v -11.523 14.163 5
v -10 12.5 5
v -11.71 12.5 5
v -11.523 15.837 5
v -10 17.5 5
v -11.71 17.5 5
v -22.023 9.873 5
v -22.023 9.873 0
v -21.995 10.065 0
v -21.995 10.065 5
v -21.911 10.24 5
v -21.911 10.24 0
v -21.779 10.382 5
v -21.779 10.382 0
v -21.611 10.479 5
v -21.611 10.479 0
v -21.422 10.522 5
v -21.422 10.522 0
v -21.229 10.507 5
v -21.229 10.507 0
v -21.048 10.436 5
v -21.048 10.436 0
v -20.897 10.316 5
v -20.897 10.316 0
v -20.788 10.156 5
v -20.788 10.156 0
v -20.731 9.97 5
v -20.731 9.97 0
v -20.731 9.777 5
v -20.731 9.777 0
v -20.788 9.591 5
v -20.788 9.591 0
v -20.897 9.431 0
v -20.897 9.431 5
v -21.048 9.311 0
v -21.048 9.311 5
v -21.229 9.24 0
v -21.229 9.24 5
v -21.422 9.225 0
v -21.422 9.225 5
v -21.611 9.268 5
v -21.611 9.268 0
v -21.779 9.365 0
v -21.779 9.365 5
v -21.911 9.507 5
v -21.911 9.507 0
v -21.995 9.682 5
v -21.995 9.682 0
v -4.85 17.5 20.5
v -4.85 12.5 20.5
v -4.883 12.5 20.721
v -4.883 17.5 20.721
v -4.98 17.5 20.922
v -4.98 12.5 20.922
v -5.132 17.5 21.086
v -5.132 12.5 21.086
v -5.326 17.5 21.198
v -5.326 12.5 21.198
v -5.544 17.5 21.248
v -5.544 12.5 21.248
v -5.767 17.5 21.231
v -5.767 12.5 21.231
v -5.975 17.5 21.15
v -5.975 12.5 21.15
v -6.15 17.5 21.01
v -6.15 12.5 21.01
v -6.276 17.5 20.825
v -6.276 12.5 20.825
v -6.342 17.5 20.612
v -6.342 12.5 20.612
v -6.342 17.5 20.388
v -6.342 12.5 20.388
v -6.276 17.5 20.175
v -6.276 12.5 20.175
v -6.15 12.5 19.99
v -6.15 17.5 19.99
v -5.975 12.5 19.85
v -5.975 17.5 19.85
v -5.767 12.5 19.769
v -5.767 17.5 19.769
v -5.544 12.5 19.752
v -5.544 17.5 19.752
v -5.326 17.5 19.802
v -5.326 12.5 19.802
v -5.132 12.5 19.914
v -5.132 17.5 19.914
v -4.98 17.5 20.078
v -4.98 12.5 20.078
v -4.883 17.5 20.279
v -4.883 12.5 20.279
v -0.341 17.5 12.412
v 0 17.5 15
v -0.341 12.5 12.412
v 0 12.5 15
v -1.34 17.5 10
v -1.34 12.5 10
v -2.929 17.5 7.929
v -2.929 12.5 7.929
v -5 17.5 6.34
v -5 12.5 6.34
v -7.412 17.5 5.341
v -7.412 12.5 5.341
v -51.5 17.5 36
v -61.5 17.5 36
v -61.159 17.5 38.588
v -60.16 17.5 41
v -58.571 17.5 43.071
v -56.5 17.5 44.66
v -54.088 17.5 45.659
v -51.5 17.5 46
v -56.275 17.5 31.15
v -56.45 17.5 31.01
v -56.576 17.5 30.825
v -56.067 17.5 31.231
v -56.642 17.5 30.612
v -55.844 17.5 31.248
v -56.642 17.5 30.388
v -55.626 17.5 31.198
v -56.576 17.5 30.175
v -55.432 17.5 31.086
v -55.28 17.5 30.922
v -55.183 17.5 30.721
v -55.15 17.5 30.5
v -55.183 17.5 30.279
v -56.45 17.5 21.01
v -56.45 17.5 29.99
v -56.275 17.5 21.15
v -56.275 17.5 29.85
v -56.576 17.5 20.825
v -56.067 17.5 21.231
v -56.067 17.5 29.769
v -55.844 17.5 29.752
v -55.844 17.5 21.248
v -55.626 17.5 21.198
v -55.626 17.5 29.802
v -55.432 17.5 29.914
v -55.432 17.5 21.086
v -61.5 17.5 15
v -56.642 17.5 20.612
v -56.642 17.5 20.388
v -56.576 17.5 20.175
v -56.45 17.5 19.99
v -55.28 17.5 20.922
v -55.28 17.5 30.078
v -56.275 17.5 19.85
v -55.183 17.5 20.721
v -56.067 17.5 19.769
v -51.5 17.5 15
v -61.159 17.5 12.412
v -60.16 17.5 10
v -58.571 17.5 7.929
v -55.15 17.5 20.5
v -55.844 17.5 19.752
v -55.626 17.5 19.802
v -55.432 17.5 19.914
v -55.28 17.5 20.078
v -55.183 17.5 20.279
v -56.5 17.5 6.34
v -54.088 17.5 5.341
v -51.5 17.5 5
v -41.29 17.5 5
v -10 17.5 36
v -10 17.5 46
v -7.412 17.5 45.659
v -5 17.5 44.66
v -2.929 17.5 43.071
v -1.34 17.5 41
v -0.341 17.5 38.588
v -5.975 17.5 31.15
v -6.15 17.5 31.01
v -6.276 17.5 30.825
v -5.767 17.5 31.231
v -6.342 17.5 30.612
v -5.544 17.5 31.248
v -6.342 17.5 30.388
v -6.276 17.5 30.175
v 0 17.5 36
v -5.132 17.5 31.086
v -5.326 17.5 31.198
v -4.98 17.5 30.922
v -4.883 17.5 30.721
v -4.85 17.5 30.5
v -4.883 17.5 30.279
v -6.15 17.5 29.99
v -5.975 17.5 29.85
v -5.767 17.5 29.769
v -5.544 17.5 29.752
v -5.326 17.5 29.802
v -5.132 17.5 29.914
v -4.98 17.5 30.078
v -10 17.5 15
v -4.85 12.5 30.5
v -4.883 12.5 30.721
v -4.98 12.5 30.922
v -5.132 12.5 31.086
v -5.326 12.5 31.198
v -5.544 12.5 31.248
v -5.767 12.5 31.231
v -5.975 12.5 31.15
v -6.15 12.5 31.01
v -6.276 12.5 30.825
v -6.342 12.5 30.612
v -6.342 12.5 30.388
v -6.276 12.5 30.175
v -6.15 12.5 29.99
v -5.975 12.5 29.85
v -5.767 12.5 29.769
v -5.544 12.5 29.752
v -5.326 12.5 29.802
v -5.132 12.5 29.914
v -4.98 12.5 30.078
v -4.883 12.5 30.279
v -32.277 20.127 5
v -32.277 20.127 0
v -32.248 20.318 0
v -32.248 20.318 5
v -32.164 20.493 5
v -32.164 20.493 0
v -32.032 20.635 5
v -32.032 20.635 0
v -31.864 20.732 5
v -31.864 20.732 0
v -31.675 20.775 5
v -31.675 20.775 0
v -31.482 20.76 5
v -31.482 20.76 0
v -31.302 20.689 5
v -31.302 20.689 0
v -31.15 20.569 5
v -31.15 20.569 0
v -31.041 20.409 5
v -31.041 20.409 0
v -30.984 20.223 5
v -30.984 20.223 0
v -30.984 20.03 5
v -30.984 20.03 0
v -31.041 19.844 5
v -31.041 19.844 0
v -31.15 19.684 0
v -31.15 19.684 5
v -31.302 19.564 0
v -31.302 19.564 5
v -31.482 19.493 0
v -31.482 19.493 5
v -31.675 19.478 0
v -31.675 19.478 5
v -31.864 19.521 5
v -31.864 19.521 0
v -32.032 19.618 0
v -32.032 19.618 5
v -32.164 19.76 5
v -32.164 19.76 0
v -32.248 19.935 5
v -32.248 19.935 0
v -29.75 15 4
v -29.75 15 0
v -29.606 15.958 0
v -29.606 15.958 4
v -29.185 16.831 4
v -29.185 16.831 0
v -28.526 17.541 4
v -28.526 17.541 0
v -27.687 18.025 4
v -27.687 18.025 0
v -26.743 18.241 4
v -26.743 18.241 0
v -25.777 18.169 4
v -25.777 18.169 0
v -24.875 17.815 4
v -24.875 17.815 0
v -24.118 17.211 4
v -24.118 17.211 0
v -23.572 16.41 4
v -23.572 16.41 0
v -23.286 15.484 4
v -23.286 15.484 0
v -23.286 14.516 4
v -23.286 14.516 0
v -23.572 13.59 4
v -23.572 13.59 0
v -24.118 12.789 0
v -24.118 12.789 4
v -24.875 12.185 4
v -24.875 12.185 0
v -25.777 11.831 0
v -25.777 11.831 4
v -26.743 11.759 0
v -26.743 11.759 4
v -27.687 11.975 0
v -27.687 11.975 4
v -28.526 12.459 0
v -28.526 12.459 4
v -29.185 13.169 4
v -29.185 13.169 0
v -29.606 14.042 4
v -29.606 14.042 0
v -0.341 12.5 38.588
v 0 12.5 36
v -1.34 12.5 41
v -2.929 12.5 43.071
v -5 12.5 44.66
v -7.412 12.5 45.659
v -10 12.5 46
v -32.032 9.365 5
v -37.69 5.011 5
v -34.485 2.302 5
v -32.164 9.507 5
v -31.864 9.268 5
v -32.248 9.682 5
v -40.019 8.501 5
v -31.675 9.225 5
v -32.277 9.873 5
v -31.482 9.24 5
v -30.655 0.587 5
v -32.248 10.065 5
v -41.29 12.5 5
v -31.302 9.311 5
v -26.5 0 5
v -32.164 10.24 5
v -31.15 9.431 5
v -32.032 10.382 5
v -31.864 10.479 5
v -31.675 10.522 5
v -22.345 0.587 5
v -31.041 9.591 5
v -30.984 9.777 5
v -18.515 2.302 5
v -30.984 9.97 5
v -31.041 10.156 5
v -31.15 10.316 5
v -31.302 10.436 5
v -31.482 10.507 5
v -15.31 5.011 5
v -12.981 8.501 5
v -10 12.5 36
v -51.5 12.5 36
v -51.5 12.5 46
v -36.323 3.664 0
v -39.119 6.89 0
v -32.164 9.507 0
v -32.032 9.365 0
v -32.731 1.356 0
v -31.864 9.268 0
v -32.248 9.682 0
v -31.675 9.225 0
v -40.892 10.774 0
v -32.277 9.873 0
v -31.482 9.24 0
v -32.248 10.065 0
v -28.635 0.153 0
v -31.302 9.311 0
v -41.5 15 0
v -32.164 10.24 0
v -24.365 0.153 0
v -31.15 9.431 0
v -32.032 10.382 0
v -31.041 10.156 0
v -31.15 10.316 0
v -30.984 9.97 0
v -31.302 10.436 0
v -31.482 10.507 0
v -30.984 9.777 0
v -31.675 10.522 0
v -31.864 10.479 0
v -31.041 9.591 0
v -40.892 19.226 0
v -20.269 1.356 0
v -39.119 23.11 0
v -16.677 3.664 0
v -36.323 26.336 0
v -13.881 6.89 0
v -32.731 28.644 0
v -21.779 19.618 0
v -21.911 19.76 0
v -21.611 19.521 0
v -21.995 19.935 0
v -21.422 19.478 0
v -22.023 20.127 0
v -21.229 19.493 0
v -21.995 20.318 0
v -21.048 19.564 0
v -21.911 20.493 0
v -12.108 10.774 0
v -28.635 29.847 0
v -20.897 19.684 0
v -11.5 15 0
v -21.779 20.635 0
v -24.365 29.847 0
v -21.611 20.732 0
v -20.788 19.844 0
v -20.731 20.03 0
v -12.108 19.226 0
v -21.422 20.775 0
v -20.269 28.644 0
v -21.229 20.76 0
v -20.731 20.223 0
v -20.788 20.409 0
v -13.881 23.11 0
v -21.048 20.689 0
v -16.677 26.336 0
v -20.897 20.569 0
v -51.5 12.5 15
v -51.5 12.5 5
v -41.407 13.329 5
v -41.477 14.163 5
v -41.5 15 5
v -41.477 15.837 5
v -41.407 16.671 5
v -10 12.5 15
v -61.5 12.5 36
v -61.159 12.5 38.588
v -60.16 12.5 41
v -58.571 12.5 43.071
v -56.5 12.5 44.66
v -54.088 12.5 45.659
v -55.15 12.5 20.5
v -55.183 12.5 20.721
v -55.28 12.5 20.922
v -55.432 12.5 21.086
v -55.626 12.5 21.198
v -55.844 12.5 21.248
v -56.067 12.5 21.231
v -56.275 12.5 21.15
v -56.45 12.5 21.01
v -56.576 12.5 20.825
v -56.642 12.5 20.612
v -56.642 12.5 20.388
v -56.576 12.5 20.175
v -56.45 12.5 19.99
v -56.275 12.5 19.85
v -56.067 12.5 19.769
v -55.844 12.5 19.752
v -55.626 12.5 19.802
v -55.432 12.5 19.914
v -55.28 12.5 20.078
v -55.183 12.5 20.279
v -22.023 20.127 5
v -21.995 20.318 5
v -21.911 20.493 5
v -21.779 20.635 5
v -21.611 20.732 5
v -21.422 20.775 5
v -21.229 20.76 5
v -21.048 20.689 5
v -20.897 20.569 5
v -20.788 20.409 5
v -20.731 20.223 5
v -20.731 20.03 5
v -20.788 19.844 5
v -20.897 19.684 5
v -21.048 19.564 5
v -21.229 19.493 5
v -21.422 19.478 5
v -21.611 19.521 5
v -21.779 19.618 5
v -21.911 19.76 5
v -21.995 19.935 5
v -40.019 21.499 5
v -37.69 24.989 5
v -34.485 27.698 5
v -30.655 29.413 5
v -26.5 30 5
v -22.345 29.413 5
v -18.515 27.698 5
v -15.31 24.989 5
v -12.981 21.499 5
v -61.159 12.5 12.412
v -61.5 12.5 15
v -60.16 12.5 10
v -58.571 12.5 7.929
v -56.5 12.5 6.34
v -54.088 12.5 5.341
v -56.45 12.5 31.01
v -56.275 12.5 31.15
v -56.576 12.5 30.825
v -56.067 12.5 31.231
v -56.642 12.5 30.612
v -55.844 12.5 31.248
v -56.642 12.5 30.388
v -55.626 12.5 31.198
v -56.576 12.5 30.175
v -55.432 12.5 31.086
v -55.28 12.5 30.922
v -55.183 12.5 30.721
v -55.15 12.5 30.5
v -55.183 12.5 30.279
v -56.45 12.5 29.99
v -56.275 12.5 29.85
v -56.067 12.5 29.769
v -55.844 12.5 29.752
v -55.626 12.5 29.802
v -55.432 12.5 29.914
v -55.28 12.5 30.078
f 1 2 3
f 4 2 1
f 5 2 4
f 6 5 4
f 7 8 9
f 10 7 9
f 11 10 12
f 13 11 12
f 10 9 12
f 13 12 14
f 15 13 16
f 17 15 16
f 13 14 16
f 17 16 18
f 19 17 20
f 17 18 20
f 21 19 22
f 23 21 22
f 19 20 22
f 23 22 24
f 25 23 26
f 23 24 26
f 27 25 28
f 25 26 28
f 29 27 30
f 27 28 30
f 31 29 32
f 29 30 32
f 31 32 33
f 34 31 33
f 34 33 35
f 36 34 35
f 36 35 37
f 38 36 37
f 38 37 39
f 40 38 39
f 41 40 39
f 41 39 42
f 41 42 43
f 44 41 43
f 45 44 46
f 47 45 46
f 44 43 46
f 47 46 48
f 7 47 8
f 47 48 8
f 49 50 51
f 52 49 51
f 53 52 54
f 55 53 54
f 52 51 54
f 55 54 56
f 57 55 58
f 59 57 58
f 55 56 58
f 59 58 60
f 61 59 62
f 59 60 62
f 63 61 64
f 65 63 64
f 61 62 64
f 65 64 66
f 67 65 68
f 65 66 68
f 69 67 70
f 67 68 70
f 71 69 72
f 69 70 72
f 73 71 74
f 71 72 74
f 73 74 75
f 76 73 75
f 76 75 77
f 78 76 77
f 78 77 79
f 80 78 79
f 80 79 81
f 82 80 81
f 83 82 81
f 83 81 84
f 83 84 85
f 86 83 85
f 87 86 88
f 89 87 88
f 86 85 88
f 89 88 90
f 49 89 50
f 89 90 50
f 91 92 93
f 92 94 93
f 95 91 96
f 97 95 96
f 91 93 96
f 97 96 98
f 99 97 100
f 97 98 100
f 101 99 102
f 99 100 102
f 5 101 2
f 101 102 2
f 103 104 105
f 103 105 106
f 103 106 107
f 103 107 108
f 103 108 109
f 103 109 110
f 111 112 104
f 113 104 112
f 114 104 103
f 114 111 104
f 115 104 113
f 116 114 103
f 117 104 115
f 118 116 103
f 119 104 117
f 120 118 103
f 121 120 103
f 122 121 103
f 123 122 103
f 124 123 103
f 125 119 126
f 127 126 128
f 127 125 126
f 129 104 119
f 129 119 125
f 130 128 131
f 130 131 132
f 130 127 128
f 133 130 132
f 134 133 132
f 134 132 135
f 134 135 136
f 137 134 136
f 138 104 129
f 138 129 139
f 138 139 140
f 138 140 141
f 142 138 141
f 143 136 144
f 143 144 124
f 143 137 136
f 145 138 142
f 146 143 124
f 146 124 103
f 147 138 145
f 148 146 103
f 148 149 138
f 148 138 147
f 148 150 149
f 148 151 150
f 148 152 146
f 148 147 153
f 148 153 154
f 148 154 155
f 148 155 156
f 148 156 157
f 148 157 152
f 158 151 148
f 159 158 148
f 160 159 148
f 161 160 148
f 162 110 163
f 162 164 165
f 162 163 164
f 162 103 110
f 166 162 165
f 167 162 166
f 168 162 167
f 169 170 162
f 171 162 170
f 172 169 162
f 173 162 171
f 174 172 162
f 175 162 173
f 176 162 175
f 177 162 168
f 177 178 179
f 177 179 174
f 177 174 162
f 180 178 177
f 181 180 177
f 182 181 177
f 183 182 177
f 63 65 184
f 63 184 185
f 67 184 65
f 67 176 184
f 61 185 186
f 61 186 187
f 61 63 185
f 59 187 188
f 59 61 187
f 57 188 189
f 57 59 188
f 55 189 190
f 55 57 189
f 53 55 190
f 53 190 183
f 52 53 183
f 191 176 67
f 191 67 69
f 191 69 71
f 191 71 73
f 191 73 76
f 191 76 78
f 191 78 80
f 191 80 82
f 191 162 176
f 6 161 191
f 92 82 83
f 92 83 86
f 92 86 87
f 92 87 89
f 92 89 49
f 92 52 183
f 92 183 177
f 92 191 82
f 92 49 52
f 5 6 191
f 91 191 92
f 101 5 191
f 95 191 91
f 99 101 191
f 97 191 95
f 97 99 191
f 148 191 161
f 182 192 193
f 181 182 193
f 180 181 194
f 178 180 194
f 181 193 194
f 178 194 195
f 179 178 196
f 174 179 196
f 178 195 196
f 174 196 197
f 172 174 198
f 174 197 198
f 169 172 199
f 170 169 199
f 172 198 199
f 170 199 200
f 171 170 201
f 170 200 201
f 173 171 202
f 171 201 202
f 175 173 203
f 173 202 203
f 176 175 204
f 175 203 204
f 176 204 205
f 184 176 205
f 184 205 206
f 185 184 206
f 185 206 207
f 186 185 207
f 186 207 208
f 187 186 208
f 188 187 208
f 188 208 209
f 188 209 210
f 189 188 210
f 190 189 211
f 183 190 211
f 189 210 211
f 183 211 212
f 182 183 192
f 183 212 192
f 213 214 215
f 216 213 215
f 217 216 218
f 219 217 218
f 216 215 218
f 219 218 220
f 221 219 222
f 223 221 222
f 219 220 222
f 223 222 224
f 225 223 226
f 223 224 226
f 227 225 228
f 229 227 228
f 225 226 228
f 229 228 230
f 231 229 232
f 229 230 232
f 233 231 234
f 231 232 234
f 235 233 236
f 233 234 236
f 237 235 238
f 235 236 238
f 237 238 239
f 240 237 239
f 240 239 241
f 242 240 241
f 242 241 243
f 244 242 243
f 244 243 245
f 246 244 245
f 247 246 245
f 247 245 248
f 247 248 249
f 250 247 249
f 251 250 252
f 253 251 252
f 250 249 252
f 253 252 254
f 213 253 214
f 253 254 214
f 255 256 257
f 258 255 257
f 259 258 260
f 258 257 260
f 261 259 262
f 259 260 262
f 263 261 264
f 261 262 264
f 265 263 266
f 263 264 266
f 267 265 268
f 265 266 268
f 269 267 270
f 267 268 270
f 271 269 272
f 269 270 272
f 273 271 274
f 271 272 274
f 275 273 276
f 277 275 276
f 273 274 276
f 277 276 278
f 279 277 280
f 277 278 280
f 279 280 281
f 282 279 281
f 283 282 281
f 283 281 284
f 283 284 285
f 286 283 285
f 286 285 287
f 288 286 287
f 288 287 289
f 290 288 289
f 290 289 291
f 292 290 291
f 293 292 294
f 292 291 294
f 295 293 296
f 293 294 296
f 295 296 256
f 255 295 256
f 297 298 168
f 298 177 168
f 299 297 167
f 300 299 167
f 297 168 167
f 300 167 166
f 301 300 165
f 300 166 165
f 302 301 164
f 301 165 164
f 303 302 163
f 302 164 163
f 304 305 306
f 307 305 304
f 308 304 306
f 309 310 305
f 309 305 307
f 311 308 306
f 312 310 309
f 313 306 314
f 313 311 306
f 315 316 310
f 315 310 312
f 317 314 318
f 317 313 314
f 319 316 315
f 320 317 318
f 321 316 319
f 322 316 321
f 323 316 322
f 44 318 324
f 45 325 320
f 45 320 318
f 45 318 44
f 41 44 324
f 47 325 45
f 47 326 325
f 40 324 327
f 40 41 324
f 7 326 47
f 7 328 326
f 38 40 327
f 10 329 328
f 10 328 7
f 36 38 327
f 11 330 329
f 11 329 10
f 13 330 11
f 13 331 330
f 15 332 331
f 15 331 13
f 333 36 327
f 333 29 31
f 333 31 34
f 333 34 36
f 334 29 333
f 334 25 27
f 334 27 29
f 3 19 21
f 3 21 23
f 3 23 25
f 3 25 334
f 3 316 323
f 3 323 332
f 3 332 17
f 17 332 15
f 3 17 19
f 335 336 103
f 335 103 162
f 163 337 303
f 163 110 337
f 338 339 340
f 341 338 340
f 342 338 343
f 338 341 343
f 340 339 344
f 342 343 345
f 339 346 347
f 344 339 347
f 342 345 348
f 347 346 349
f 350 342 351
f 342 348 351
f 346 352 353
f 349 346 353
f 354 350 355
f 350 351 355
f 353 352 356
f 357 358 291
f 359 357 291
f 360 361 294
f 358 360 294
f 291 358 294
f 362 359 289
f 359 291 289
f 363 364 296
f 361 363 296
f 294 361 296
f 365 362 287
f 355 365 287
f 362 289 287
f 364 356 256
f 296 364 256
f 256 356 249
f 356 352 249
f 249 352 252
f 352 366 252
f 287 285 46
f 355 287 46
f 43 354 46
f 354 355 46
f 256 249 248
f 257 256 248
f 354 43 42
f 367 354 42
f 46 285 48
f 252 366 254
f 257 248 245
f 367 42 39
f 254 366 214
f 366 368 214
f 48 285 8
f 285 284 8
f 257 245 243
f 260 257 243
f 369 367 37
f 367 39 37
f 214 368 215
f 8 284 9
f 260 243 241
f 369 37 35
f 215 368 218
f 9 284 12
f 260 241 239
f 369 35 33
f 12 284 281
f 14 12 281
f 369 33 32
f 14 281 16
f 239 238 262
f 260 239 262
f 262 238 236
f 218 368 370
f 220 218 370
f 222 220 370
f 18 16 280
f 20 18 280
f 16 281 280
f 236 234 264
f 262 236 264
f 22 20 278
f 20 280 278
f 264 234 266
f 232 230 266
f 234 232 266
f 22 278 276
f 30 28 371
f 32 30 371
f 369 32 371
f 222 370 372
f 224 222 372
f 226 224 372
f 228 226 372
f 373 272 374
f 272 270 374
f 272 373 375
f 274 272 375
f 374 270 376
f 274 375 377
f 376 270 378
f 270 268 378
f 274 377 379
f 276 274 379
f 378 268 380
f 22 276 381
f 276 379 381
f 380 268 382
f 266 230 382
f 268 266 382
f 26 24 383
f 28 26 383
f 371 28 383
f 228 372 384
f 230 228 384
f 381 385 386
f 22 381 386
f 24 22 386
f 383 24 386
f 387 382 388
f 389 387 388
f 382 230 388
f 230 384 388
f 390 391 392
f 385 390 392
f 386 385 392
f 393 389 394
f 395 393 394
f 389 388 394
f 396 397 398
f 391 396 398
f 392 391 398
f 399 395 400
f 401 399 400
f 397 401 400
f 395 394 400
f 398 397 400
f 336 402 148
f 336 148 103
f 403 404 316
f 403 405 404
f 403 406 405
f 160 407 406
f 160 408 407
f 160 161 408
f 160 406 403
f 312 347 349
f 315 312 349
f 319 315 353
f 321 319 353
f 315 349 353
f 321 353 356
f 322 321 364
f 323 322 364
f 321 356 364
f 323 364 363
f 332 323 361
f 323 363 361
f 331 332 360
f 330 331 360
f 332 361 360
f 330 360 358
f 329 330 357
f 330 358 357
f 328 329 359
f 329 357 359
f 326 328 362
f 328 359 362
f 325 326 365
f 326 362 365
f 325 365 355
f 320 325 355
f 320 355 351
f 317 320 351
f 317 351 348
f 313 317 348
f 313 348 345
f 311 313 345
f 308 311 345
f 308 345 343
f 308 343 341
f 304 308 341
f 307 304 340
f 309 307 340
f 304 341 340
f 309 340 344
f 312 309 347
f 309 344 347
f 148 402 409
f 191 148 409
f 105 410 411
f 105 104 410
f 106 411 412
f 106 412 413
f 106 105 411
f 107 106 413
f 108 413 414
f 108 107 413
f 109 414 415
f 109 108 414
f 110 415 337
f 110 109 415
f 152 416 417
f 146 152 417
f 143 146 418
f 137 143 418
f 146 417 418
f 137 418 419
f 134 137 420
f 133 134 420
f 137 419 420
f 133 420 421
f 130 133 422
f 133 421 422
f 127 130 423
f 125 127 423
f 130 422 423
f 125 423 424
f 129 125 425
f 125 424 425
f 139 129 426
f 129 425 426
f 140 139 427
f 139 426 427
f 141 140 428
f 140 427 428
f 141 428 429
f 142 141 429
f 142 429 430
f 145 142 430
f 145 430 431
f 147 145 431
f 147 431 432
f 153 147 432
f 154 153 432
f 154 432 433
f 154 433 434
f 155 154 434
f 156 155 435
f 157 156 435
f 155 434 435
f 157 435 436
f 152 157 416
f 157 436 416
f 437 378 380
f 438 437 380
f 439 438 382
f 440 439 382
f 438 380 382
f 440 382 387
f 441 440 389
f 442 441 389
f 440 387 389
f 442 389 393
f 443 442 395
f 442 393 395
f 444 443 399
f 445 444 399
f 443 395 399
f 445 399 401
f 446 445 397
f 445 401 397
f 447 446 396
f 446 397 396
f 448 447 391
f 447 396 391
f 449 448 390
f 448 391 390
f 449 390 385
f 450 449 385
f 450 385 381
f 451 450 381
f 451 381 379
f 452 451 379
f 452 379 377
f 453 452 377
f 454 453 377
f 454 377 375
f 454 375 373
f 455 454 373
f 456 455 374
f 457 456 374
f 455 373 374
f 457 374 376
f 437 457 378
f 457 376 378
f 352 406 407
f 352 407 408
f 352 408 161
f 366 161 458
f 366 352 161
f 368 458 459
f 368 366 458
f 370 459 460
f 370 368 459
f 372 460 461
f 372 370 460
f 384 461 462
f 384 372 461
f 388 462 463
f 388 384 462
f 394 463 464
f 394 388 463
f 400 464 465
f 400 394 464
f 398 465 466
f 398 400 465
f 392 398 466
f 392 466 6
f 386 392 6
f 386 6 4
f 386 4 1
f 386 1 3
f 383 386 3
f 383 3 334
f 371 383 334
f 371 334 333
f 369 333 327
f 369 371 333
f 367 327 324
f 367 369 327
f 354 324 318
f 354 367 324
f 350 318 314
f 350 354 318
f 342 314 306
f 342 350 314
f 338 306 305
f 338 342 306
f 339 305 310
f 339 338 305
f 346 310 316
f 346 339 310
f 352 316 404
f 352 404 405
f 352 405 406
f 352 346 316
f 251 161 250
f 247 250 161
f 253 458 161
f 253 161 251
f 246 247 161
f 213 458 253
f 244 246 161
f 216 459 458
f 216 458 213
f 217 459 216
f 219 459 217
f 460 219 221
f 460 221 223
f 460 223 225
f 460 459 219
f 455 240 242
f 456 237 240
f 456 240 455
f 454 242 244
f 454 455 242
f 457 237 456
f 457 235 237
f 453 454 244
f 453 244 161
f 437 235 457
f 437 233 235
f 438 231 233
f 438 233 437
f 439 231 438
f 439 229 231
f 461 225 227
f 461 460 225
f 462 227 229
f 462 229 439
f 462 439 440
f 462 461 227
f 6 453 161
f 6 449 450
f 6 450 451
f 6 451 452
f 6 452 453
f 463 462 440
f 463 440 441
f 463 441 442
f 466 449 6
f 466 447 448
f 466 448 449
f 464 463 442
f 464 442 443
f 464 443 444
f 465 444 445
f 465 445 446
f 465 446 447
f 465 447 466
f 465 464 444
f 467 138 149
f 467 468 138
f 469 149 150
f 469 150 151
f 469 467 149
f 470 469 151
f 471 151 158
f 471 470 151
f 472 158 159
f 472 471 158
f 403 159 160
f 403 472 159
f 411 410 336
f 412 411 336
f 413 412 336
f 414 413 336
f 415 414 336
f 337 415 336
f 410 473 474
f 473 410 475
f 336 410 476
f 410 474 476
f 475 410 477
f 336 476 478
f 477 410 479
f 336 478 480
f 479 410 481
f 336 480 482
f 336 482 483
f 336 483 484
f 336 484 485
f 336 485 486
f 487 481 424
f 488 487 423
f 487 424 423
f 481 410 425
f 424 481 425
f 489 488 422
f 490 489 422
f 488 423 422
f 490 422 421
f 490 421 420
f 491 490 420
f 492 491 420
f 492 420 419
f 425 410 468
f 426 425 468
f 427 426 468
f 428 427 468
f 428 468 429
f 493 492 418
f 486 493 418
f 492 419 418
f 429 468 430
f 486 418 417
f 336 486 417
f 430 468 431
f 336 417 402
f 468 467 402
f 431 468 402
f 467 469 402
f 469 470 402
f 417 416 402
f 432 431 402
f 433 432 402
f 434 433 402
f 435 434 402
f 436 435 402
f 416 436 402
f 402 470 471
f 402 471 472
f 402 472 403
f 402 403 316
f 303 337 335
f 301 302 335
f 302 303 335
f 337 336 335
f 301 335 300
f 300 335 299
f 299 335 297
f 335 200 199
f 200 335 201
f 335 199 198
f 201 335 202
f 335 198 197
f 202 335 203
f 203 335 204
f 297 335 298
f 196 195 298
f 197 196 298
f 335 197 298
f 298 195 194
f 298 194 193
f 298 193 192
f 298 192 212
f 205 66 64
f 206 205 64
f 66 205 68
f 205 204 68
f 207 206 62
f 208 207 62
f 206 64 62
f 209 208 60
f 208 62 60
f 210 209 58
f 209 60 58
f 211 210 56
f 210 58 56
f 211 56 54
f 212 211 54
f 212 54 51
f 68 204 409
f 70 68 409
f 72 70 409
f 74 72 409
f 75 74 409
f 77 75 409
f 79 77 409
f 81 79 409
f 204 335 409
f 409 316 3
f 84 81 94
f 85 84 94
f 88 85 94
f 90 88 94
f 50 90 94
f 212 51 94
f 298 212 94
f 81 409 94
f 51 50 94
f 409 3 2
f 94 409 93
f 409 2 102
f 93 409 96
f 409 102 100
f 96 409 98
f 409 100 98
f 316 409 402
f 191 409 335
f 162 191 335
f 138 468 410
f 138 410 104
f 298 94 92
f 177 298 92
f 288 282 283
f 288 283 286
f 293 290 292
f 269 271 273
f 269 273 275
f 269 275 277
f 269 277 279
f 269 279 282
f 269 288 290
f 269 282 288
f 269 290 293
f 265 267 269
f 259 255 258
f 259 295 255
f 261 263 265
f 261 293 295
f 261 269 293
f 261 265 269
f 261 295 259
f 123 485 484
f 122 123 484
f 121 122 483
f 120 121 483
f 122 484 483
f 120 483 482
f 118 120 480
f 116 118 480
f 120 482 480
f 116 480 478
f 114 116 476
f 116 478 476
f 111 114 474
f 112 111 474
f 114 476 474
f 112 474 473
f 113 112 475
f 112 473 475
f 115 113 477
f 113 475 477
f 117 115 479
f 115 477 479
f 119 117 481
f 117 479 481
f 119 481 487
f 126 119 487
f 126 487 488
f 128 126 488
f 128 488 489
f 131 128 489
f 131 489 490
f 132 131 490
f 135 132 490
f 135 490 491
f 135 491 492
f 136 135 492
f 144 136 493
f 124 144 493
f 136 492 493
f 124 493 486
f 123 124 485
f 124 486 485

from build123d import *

# Parameters (mm, degrees)
SKETCH1_W           = 61.5
SKETCH1_H           = 30
BOSS_EXTRUDE2_DEPTH = 5
SKETCH2_W           = 61.5
SKETCH2_H           = 5
BOSS_EXTRUDE3_DEPTH = 41
SKETCH3_W           = 41.5
SKETCH3_H           = 21
CUT_EXTRUDE1_DEPTH  = 5
SKETCH4_OUTSIDE_W   = 79.99
SKETCH4_OUTSIDE_H   = 48.49
SKETCH4_OUTSIDE_R   = 15
CUT_EXTRUDE2_DEPTH  = 5
SKETCH5_R           = 3.25
CUT_EXTRUDE5_DEPTH  = 4
FILLET1_R           = 10
FILLET2_R           = 10
FILLET3_R           = 10
FILLET4_R           = 10
SKETCH7_R           = 0.75
CUT_EXTRUDE7_DEPTH  = 5
SKETCH8_R           = 0.65
CUT_EXTRUDE8_DEPTH  = 5


with BuildPart() as part:
    # Sketch1 → Boss-Extrude2 (new body)
    with BuildSketch(Plane.XY):
        with Locations((-30.75, 15)):
            Rectangle(SKETCH1_W, SKETCH1_H)
    extrude(amount=BOSS_EXTRUDE2_DEPTH)

    # Sketch2 → Boss-Extrude3 (add)
    with BuildSketch(Plane.XY.offset(5)):
        with Locations((-30.75, 15)):
            Rectangle(SKETCH2_W, SKETCH2_H)
    extrude(amount=BOSS_EXTRUDE3_DEPTH)

    # Sketch3 → Cut-Extrude1 (cut)
    with BuildSketch(Plane.XZ.offset(-12.5)):
        with Locations((-30.75, 25.5)):
            Rectangle(SKETCH3_W, SKETCH3_H)
    extrude(amount=-CUT_EXTRUDE1_DEPTH, mode=Mode.SUBTRACT)

    # Sketch4 outside → Cut-Extrude2 (cut)
    with BuildSketch(Plane(origin=(0, 0, 0), x_dir=(-1, 0, 0), z_dir=(0, 0, -1))):
        with Locations((30.75, 15)):
            Rectangle(SKETCH4_OUTSIDE_W, SKETCH4_OUTSIDE_H)
        with Locations((26.5, 15)):
            Circle(SKETCH4_OUTSIDE_R, mode=Mode.SUBTRACT)
    extrude(amount=-CUT_EXTRUDE2_DEPTH, mode=Mode.SUBTRACT)

    # Sketch5 → Cut-Extrude5 (cut)
    with BuildSketch(Plane(origin=(0, 0, 0), x_dir=(-1, 0, 0), z_dir=(0, 0, -1))):
        with Locations((26.5, 15)):
            Circle(SKETCH5_R)
    extrude(amount=-CUT_EXTRUDE5_DEPTH, mode=Mode.SUBTRACT)

    # Fillet1
    fillet1_edges = [part.edges().sort_by_distance(p)[0] for p in [
        (-61.5, 15, 5),
    ]]
    fillet(fillet1_edges, radius=FILLET1_R)

    # Fillet2
    fillet2_edges = [part.edges().sort_by_distance(p)[0] for p in [
        (-61.5, 15, 46),
    ]]
    fillet(fillet2_edges, radius=FILLET2_R)

    # Fillet3
    fillet3_edges = [part.edges().sort_by_distance(p)[0] for p in [
        (0, 15, 5),
    ]]
    fillet(fillet3_edges, radius=FILLET3_R)

    # Fillet4
    fillet4_edges = [part.edges().sort_by_distance(p)[0] for p in [
        (0, 15, 46),
    ]]
    fillet(fillet4_edges, radius=FILLET4_R)

    # Sketch7 → Cut-Extrude7 (cut)
    with BuildSketch(Plane.XZ.offset(-12.5)):
        with Locations((-55.9, 20.5)):
            Circle(SKETCH7_R)
        with Locations((-55.9, 30.5)):
            Circle(SKETCH7_R)
        with Locations((-5.6, 30.5)):
            Circle(SKETCH7_R)
        with Locations((-5.6, 20.5)):
            Circle(SKETCH7_R)
    extrude(amount=-CUT_EXTRUDE7_DEPTH, mode=Mode.SUBTRACT)

    # Sketch8 → Cut-Extrude8 (cut)
    with BuildSketch(Plane(origin=(0, 0, 0), x_dir=(-1, 0, 0), z_dir=(0, 0, -1))):
        with Locations((31.626524164, 20.126524164)):
            Circle(SKETCH8_R)
        with Locations((31.626524164, 9.873475836)):
            Circle(SKETCH8_R)
        with Locations((21.373475836, 9.873475836)):
            Circle(SKETCH8_R)
        with Locations((21.373475836, 20.126524164)):
            Circle(SKETCH8_R)
    extrude(amount=-CUT_EXTRUDE8_DEPTH, mode=Mode.SUBTRACT)


solid = part.part
